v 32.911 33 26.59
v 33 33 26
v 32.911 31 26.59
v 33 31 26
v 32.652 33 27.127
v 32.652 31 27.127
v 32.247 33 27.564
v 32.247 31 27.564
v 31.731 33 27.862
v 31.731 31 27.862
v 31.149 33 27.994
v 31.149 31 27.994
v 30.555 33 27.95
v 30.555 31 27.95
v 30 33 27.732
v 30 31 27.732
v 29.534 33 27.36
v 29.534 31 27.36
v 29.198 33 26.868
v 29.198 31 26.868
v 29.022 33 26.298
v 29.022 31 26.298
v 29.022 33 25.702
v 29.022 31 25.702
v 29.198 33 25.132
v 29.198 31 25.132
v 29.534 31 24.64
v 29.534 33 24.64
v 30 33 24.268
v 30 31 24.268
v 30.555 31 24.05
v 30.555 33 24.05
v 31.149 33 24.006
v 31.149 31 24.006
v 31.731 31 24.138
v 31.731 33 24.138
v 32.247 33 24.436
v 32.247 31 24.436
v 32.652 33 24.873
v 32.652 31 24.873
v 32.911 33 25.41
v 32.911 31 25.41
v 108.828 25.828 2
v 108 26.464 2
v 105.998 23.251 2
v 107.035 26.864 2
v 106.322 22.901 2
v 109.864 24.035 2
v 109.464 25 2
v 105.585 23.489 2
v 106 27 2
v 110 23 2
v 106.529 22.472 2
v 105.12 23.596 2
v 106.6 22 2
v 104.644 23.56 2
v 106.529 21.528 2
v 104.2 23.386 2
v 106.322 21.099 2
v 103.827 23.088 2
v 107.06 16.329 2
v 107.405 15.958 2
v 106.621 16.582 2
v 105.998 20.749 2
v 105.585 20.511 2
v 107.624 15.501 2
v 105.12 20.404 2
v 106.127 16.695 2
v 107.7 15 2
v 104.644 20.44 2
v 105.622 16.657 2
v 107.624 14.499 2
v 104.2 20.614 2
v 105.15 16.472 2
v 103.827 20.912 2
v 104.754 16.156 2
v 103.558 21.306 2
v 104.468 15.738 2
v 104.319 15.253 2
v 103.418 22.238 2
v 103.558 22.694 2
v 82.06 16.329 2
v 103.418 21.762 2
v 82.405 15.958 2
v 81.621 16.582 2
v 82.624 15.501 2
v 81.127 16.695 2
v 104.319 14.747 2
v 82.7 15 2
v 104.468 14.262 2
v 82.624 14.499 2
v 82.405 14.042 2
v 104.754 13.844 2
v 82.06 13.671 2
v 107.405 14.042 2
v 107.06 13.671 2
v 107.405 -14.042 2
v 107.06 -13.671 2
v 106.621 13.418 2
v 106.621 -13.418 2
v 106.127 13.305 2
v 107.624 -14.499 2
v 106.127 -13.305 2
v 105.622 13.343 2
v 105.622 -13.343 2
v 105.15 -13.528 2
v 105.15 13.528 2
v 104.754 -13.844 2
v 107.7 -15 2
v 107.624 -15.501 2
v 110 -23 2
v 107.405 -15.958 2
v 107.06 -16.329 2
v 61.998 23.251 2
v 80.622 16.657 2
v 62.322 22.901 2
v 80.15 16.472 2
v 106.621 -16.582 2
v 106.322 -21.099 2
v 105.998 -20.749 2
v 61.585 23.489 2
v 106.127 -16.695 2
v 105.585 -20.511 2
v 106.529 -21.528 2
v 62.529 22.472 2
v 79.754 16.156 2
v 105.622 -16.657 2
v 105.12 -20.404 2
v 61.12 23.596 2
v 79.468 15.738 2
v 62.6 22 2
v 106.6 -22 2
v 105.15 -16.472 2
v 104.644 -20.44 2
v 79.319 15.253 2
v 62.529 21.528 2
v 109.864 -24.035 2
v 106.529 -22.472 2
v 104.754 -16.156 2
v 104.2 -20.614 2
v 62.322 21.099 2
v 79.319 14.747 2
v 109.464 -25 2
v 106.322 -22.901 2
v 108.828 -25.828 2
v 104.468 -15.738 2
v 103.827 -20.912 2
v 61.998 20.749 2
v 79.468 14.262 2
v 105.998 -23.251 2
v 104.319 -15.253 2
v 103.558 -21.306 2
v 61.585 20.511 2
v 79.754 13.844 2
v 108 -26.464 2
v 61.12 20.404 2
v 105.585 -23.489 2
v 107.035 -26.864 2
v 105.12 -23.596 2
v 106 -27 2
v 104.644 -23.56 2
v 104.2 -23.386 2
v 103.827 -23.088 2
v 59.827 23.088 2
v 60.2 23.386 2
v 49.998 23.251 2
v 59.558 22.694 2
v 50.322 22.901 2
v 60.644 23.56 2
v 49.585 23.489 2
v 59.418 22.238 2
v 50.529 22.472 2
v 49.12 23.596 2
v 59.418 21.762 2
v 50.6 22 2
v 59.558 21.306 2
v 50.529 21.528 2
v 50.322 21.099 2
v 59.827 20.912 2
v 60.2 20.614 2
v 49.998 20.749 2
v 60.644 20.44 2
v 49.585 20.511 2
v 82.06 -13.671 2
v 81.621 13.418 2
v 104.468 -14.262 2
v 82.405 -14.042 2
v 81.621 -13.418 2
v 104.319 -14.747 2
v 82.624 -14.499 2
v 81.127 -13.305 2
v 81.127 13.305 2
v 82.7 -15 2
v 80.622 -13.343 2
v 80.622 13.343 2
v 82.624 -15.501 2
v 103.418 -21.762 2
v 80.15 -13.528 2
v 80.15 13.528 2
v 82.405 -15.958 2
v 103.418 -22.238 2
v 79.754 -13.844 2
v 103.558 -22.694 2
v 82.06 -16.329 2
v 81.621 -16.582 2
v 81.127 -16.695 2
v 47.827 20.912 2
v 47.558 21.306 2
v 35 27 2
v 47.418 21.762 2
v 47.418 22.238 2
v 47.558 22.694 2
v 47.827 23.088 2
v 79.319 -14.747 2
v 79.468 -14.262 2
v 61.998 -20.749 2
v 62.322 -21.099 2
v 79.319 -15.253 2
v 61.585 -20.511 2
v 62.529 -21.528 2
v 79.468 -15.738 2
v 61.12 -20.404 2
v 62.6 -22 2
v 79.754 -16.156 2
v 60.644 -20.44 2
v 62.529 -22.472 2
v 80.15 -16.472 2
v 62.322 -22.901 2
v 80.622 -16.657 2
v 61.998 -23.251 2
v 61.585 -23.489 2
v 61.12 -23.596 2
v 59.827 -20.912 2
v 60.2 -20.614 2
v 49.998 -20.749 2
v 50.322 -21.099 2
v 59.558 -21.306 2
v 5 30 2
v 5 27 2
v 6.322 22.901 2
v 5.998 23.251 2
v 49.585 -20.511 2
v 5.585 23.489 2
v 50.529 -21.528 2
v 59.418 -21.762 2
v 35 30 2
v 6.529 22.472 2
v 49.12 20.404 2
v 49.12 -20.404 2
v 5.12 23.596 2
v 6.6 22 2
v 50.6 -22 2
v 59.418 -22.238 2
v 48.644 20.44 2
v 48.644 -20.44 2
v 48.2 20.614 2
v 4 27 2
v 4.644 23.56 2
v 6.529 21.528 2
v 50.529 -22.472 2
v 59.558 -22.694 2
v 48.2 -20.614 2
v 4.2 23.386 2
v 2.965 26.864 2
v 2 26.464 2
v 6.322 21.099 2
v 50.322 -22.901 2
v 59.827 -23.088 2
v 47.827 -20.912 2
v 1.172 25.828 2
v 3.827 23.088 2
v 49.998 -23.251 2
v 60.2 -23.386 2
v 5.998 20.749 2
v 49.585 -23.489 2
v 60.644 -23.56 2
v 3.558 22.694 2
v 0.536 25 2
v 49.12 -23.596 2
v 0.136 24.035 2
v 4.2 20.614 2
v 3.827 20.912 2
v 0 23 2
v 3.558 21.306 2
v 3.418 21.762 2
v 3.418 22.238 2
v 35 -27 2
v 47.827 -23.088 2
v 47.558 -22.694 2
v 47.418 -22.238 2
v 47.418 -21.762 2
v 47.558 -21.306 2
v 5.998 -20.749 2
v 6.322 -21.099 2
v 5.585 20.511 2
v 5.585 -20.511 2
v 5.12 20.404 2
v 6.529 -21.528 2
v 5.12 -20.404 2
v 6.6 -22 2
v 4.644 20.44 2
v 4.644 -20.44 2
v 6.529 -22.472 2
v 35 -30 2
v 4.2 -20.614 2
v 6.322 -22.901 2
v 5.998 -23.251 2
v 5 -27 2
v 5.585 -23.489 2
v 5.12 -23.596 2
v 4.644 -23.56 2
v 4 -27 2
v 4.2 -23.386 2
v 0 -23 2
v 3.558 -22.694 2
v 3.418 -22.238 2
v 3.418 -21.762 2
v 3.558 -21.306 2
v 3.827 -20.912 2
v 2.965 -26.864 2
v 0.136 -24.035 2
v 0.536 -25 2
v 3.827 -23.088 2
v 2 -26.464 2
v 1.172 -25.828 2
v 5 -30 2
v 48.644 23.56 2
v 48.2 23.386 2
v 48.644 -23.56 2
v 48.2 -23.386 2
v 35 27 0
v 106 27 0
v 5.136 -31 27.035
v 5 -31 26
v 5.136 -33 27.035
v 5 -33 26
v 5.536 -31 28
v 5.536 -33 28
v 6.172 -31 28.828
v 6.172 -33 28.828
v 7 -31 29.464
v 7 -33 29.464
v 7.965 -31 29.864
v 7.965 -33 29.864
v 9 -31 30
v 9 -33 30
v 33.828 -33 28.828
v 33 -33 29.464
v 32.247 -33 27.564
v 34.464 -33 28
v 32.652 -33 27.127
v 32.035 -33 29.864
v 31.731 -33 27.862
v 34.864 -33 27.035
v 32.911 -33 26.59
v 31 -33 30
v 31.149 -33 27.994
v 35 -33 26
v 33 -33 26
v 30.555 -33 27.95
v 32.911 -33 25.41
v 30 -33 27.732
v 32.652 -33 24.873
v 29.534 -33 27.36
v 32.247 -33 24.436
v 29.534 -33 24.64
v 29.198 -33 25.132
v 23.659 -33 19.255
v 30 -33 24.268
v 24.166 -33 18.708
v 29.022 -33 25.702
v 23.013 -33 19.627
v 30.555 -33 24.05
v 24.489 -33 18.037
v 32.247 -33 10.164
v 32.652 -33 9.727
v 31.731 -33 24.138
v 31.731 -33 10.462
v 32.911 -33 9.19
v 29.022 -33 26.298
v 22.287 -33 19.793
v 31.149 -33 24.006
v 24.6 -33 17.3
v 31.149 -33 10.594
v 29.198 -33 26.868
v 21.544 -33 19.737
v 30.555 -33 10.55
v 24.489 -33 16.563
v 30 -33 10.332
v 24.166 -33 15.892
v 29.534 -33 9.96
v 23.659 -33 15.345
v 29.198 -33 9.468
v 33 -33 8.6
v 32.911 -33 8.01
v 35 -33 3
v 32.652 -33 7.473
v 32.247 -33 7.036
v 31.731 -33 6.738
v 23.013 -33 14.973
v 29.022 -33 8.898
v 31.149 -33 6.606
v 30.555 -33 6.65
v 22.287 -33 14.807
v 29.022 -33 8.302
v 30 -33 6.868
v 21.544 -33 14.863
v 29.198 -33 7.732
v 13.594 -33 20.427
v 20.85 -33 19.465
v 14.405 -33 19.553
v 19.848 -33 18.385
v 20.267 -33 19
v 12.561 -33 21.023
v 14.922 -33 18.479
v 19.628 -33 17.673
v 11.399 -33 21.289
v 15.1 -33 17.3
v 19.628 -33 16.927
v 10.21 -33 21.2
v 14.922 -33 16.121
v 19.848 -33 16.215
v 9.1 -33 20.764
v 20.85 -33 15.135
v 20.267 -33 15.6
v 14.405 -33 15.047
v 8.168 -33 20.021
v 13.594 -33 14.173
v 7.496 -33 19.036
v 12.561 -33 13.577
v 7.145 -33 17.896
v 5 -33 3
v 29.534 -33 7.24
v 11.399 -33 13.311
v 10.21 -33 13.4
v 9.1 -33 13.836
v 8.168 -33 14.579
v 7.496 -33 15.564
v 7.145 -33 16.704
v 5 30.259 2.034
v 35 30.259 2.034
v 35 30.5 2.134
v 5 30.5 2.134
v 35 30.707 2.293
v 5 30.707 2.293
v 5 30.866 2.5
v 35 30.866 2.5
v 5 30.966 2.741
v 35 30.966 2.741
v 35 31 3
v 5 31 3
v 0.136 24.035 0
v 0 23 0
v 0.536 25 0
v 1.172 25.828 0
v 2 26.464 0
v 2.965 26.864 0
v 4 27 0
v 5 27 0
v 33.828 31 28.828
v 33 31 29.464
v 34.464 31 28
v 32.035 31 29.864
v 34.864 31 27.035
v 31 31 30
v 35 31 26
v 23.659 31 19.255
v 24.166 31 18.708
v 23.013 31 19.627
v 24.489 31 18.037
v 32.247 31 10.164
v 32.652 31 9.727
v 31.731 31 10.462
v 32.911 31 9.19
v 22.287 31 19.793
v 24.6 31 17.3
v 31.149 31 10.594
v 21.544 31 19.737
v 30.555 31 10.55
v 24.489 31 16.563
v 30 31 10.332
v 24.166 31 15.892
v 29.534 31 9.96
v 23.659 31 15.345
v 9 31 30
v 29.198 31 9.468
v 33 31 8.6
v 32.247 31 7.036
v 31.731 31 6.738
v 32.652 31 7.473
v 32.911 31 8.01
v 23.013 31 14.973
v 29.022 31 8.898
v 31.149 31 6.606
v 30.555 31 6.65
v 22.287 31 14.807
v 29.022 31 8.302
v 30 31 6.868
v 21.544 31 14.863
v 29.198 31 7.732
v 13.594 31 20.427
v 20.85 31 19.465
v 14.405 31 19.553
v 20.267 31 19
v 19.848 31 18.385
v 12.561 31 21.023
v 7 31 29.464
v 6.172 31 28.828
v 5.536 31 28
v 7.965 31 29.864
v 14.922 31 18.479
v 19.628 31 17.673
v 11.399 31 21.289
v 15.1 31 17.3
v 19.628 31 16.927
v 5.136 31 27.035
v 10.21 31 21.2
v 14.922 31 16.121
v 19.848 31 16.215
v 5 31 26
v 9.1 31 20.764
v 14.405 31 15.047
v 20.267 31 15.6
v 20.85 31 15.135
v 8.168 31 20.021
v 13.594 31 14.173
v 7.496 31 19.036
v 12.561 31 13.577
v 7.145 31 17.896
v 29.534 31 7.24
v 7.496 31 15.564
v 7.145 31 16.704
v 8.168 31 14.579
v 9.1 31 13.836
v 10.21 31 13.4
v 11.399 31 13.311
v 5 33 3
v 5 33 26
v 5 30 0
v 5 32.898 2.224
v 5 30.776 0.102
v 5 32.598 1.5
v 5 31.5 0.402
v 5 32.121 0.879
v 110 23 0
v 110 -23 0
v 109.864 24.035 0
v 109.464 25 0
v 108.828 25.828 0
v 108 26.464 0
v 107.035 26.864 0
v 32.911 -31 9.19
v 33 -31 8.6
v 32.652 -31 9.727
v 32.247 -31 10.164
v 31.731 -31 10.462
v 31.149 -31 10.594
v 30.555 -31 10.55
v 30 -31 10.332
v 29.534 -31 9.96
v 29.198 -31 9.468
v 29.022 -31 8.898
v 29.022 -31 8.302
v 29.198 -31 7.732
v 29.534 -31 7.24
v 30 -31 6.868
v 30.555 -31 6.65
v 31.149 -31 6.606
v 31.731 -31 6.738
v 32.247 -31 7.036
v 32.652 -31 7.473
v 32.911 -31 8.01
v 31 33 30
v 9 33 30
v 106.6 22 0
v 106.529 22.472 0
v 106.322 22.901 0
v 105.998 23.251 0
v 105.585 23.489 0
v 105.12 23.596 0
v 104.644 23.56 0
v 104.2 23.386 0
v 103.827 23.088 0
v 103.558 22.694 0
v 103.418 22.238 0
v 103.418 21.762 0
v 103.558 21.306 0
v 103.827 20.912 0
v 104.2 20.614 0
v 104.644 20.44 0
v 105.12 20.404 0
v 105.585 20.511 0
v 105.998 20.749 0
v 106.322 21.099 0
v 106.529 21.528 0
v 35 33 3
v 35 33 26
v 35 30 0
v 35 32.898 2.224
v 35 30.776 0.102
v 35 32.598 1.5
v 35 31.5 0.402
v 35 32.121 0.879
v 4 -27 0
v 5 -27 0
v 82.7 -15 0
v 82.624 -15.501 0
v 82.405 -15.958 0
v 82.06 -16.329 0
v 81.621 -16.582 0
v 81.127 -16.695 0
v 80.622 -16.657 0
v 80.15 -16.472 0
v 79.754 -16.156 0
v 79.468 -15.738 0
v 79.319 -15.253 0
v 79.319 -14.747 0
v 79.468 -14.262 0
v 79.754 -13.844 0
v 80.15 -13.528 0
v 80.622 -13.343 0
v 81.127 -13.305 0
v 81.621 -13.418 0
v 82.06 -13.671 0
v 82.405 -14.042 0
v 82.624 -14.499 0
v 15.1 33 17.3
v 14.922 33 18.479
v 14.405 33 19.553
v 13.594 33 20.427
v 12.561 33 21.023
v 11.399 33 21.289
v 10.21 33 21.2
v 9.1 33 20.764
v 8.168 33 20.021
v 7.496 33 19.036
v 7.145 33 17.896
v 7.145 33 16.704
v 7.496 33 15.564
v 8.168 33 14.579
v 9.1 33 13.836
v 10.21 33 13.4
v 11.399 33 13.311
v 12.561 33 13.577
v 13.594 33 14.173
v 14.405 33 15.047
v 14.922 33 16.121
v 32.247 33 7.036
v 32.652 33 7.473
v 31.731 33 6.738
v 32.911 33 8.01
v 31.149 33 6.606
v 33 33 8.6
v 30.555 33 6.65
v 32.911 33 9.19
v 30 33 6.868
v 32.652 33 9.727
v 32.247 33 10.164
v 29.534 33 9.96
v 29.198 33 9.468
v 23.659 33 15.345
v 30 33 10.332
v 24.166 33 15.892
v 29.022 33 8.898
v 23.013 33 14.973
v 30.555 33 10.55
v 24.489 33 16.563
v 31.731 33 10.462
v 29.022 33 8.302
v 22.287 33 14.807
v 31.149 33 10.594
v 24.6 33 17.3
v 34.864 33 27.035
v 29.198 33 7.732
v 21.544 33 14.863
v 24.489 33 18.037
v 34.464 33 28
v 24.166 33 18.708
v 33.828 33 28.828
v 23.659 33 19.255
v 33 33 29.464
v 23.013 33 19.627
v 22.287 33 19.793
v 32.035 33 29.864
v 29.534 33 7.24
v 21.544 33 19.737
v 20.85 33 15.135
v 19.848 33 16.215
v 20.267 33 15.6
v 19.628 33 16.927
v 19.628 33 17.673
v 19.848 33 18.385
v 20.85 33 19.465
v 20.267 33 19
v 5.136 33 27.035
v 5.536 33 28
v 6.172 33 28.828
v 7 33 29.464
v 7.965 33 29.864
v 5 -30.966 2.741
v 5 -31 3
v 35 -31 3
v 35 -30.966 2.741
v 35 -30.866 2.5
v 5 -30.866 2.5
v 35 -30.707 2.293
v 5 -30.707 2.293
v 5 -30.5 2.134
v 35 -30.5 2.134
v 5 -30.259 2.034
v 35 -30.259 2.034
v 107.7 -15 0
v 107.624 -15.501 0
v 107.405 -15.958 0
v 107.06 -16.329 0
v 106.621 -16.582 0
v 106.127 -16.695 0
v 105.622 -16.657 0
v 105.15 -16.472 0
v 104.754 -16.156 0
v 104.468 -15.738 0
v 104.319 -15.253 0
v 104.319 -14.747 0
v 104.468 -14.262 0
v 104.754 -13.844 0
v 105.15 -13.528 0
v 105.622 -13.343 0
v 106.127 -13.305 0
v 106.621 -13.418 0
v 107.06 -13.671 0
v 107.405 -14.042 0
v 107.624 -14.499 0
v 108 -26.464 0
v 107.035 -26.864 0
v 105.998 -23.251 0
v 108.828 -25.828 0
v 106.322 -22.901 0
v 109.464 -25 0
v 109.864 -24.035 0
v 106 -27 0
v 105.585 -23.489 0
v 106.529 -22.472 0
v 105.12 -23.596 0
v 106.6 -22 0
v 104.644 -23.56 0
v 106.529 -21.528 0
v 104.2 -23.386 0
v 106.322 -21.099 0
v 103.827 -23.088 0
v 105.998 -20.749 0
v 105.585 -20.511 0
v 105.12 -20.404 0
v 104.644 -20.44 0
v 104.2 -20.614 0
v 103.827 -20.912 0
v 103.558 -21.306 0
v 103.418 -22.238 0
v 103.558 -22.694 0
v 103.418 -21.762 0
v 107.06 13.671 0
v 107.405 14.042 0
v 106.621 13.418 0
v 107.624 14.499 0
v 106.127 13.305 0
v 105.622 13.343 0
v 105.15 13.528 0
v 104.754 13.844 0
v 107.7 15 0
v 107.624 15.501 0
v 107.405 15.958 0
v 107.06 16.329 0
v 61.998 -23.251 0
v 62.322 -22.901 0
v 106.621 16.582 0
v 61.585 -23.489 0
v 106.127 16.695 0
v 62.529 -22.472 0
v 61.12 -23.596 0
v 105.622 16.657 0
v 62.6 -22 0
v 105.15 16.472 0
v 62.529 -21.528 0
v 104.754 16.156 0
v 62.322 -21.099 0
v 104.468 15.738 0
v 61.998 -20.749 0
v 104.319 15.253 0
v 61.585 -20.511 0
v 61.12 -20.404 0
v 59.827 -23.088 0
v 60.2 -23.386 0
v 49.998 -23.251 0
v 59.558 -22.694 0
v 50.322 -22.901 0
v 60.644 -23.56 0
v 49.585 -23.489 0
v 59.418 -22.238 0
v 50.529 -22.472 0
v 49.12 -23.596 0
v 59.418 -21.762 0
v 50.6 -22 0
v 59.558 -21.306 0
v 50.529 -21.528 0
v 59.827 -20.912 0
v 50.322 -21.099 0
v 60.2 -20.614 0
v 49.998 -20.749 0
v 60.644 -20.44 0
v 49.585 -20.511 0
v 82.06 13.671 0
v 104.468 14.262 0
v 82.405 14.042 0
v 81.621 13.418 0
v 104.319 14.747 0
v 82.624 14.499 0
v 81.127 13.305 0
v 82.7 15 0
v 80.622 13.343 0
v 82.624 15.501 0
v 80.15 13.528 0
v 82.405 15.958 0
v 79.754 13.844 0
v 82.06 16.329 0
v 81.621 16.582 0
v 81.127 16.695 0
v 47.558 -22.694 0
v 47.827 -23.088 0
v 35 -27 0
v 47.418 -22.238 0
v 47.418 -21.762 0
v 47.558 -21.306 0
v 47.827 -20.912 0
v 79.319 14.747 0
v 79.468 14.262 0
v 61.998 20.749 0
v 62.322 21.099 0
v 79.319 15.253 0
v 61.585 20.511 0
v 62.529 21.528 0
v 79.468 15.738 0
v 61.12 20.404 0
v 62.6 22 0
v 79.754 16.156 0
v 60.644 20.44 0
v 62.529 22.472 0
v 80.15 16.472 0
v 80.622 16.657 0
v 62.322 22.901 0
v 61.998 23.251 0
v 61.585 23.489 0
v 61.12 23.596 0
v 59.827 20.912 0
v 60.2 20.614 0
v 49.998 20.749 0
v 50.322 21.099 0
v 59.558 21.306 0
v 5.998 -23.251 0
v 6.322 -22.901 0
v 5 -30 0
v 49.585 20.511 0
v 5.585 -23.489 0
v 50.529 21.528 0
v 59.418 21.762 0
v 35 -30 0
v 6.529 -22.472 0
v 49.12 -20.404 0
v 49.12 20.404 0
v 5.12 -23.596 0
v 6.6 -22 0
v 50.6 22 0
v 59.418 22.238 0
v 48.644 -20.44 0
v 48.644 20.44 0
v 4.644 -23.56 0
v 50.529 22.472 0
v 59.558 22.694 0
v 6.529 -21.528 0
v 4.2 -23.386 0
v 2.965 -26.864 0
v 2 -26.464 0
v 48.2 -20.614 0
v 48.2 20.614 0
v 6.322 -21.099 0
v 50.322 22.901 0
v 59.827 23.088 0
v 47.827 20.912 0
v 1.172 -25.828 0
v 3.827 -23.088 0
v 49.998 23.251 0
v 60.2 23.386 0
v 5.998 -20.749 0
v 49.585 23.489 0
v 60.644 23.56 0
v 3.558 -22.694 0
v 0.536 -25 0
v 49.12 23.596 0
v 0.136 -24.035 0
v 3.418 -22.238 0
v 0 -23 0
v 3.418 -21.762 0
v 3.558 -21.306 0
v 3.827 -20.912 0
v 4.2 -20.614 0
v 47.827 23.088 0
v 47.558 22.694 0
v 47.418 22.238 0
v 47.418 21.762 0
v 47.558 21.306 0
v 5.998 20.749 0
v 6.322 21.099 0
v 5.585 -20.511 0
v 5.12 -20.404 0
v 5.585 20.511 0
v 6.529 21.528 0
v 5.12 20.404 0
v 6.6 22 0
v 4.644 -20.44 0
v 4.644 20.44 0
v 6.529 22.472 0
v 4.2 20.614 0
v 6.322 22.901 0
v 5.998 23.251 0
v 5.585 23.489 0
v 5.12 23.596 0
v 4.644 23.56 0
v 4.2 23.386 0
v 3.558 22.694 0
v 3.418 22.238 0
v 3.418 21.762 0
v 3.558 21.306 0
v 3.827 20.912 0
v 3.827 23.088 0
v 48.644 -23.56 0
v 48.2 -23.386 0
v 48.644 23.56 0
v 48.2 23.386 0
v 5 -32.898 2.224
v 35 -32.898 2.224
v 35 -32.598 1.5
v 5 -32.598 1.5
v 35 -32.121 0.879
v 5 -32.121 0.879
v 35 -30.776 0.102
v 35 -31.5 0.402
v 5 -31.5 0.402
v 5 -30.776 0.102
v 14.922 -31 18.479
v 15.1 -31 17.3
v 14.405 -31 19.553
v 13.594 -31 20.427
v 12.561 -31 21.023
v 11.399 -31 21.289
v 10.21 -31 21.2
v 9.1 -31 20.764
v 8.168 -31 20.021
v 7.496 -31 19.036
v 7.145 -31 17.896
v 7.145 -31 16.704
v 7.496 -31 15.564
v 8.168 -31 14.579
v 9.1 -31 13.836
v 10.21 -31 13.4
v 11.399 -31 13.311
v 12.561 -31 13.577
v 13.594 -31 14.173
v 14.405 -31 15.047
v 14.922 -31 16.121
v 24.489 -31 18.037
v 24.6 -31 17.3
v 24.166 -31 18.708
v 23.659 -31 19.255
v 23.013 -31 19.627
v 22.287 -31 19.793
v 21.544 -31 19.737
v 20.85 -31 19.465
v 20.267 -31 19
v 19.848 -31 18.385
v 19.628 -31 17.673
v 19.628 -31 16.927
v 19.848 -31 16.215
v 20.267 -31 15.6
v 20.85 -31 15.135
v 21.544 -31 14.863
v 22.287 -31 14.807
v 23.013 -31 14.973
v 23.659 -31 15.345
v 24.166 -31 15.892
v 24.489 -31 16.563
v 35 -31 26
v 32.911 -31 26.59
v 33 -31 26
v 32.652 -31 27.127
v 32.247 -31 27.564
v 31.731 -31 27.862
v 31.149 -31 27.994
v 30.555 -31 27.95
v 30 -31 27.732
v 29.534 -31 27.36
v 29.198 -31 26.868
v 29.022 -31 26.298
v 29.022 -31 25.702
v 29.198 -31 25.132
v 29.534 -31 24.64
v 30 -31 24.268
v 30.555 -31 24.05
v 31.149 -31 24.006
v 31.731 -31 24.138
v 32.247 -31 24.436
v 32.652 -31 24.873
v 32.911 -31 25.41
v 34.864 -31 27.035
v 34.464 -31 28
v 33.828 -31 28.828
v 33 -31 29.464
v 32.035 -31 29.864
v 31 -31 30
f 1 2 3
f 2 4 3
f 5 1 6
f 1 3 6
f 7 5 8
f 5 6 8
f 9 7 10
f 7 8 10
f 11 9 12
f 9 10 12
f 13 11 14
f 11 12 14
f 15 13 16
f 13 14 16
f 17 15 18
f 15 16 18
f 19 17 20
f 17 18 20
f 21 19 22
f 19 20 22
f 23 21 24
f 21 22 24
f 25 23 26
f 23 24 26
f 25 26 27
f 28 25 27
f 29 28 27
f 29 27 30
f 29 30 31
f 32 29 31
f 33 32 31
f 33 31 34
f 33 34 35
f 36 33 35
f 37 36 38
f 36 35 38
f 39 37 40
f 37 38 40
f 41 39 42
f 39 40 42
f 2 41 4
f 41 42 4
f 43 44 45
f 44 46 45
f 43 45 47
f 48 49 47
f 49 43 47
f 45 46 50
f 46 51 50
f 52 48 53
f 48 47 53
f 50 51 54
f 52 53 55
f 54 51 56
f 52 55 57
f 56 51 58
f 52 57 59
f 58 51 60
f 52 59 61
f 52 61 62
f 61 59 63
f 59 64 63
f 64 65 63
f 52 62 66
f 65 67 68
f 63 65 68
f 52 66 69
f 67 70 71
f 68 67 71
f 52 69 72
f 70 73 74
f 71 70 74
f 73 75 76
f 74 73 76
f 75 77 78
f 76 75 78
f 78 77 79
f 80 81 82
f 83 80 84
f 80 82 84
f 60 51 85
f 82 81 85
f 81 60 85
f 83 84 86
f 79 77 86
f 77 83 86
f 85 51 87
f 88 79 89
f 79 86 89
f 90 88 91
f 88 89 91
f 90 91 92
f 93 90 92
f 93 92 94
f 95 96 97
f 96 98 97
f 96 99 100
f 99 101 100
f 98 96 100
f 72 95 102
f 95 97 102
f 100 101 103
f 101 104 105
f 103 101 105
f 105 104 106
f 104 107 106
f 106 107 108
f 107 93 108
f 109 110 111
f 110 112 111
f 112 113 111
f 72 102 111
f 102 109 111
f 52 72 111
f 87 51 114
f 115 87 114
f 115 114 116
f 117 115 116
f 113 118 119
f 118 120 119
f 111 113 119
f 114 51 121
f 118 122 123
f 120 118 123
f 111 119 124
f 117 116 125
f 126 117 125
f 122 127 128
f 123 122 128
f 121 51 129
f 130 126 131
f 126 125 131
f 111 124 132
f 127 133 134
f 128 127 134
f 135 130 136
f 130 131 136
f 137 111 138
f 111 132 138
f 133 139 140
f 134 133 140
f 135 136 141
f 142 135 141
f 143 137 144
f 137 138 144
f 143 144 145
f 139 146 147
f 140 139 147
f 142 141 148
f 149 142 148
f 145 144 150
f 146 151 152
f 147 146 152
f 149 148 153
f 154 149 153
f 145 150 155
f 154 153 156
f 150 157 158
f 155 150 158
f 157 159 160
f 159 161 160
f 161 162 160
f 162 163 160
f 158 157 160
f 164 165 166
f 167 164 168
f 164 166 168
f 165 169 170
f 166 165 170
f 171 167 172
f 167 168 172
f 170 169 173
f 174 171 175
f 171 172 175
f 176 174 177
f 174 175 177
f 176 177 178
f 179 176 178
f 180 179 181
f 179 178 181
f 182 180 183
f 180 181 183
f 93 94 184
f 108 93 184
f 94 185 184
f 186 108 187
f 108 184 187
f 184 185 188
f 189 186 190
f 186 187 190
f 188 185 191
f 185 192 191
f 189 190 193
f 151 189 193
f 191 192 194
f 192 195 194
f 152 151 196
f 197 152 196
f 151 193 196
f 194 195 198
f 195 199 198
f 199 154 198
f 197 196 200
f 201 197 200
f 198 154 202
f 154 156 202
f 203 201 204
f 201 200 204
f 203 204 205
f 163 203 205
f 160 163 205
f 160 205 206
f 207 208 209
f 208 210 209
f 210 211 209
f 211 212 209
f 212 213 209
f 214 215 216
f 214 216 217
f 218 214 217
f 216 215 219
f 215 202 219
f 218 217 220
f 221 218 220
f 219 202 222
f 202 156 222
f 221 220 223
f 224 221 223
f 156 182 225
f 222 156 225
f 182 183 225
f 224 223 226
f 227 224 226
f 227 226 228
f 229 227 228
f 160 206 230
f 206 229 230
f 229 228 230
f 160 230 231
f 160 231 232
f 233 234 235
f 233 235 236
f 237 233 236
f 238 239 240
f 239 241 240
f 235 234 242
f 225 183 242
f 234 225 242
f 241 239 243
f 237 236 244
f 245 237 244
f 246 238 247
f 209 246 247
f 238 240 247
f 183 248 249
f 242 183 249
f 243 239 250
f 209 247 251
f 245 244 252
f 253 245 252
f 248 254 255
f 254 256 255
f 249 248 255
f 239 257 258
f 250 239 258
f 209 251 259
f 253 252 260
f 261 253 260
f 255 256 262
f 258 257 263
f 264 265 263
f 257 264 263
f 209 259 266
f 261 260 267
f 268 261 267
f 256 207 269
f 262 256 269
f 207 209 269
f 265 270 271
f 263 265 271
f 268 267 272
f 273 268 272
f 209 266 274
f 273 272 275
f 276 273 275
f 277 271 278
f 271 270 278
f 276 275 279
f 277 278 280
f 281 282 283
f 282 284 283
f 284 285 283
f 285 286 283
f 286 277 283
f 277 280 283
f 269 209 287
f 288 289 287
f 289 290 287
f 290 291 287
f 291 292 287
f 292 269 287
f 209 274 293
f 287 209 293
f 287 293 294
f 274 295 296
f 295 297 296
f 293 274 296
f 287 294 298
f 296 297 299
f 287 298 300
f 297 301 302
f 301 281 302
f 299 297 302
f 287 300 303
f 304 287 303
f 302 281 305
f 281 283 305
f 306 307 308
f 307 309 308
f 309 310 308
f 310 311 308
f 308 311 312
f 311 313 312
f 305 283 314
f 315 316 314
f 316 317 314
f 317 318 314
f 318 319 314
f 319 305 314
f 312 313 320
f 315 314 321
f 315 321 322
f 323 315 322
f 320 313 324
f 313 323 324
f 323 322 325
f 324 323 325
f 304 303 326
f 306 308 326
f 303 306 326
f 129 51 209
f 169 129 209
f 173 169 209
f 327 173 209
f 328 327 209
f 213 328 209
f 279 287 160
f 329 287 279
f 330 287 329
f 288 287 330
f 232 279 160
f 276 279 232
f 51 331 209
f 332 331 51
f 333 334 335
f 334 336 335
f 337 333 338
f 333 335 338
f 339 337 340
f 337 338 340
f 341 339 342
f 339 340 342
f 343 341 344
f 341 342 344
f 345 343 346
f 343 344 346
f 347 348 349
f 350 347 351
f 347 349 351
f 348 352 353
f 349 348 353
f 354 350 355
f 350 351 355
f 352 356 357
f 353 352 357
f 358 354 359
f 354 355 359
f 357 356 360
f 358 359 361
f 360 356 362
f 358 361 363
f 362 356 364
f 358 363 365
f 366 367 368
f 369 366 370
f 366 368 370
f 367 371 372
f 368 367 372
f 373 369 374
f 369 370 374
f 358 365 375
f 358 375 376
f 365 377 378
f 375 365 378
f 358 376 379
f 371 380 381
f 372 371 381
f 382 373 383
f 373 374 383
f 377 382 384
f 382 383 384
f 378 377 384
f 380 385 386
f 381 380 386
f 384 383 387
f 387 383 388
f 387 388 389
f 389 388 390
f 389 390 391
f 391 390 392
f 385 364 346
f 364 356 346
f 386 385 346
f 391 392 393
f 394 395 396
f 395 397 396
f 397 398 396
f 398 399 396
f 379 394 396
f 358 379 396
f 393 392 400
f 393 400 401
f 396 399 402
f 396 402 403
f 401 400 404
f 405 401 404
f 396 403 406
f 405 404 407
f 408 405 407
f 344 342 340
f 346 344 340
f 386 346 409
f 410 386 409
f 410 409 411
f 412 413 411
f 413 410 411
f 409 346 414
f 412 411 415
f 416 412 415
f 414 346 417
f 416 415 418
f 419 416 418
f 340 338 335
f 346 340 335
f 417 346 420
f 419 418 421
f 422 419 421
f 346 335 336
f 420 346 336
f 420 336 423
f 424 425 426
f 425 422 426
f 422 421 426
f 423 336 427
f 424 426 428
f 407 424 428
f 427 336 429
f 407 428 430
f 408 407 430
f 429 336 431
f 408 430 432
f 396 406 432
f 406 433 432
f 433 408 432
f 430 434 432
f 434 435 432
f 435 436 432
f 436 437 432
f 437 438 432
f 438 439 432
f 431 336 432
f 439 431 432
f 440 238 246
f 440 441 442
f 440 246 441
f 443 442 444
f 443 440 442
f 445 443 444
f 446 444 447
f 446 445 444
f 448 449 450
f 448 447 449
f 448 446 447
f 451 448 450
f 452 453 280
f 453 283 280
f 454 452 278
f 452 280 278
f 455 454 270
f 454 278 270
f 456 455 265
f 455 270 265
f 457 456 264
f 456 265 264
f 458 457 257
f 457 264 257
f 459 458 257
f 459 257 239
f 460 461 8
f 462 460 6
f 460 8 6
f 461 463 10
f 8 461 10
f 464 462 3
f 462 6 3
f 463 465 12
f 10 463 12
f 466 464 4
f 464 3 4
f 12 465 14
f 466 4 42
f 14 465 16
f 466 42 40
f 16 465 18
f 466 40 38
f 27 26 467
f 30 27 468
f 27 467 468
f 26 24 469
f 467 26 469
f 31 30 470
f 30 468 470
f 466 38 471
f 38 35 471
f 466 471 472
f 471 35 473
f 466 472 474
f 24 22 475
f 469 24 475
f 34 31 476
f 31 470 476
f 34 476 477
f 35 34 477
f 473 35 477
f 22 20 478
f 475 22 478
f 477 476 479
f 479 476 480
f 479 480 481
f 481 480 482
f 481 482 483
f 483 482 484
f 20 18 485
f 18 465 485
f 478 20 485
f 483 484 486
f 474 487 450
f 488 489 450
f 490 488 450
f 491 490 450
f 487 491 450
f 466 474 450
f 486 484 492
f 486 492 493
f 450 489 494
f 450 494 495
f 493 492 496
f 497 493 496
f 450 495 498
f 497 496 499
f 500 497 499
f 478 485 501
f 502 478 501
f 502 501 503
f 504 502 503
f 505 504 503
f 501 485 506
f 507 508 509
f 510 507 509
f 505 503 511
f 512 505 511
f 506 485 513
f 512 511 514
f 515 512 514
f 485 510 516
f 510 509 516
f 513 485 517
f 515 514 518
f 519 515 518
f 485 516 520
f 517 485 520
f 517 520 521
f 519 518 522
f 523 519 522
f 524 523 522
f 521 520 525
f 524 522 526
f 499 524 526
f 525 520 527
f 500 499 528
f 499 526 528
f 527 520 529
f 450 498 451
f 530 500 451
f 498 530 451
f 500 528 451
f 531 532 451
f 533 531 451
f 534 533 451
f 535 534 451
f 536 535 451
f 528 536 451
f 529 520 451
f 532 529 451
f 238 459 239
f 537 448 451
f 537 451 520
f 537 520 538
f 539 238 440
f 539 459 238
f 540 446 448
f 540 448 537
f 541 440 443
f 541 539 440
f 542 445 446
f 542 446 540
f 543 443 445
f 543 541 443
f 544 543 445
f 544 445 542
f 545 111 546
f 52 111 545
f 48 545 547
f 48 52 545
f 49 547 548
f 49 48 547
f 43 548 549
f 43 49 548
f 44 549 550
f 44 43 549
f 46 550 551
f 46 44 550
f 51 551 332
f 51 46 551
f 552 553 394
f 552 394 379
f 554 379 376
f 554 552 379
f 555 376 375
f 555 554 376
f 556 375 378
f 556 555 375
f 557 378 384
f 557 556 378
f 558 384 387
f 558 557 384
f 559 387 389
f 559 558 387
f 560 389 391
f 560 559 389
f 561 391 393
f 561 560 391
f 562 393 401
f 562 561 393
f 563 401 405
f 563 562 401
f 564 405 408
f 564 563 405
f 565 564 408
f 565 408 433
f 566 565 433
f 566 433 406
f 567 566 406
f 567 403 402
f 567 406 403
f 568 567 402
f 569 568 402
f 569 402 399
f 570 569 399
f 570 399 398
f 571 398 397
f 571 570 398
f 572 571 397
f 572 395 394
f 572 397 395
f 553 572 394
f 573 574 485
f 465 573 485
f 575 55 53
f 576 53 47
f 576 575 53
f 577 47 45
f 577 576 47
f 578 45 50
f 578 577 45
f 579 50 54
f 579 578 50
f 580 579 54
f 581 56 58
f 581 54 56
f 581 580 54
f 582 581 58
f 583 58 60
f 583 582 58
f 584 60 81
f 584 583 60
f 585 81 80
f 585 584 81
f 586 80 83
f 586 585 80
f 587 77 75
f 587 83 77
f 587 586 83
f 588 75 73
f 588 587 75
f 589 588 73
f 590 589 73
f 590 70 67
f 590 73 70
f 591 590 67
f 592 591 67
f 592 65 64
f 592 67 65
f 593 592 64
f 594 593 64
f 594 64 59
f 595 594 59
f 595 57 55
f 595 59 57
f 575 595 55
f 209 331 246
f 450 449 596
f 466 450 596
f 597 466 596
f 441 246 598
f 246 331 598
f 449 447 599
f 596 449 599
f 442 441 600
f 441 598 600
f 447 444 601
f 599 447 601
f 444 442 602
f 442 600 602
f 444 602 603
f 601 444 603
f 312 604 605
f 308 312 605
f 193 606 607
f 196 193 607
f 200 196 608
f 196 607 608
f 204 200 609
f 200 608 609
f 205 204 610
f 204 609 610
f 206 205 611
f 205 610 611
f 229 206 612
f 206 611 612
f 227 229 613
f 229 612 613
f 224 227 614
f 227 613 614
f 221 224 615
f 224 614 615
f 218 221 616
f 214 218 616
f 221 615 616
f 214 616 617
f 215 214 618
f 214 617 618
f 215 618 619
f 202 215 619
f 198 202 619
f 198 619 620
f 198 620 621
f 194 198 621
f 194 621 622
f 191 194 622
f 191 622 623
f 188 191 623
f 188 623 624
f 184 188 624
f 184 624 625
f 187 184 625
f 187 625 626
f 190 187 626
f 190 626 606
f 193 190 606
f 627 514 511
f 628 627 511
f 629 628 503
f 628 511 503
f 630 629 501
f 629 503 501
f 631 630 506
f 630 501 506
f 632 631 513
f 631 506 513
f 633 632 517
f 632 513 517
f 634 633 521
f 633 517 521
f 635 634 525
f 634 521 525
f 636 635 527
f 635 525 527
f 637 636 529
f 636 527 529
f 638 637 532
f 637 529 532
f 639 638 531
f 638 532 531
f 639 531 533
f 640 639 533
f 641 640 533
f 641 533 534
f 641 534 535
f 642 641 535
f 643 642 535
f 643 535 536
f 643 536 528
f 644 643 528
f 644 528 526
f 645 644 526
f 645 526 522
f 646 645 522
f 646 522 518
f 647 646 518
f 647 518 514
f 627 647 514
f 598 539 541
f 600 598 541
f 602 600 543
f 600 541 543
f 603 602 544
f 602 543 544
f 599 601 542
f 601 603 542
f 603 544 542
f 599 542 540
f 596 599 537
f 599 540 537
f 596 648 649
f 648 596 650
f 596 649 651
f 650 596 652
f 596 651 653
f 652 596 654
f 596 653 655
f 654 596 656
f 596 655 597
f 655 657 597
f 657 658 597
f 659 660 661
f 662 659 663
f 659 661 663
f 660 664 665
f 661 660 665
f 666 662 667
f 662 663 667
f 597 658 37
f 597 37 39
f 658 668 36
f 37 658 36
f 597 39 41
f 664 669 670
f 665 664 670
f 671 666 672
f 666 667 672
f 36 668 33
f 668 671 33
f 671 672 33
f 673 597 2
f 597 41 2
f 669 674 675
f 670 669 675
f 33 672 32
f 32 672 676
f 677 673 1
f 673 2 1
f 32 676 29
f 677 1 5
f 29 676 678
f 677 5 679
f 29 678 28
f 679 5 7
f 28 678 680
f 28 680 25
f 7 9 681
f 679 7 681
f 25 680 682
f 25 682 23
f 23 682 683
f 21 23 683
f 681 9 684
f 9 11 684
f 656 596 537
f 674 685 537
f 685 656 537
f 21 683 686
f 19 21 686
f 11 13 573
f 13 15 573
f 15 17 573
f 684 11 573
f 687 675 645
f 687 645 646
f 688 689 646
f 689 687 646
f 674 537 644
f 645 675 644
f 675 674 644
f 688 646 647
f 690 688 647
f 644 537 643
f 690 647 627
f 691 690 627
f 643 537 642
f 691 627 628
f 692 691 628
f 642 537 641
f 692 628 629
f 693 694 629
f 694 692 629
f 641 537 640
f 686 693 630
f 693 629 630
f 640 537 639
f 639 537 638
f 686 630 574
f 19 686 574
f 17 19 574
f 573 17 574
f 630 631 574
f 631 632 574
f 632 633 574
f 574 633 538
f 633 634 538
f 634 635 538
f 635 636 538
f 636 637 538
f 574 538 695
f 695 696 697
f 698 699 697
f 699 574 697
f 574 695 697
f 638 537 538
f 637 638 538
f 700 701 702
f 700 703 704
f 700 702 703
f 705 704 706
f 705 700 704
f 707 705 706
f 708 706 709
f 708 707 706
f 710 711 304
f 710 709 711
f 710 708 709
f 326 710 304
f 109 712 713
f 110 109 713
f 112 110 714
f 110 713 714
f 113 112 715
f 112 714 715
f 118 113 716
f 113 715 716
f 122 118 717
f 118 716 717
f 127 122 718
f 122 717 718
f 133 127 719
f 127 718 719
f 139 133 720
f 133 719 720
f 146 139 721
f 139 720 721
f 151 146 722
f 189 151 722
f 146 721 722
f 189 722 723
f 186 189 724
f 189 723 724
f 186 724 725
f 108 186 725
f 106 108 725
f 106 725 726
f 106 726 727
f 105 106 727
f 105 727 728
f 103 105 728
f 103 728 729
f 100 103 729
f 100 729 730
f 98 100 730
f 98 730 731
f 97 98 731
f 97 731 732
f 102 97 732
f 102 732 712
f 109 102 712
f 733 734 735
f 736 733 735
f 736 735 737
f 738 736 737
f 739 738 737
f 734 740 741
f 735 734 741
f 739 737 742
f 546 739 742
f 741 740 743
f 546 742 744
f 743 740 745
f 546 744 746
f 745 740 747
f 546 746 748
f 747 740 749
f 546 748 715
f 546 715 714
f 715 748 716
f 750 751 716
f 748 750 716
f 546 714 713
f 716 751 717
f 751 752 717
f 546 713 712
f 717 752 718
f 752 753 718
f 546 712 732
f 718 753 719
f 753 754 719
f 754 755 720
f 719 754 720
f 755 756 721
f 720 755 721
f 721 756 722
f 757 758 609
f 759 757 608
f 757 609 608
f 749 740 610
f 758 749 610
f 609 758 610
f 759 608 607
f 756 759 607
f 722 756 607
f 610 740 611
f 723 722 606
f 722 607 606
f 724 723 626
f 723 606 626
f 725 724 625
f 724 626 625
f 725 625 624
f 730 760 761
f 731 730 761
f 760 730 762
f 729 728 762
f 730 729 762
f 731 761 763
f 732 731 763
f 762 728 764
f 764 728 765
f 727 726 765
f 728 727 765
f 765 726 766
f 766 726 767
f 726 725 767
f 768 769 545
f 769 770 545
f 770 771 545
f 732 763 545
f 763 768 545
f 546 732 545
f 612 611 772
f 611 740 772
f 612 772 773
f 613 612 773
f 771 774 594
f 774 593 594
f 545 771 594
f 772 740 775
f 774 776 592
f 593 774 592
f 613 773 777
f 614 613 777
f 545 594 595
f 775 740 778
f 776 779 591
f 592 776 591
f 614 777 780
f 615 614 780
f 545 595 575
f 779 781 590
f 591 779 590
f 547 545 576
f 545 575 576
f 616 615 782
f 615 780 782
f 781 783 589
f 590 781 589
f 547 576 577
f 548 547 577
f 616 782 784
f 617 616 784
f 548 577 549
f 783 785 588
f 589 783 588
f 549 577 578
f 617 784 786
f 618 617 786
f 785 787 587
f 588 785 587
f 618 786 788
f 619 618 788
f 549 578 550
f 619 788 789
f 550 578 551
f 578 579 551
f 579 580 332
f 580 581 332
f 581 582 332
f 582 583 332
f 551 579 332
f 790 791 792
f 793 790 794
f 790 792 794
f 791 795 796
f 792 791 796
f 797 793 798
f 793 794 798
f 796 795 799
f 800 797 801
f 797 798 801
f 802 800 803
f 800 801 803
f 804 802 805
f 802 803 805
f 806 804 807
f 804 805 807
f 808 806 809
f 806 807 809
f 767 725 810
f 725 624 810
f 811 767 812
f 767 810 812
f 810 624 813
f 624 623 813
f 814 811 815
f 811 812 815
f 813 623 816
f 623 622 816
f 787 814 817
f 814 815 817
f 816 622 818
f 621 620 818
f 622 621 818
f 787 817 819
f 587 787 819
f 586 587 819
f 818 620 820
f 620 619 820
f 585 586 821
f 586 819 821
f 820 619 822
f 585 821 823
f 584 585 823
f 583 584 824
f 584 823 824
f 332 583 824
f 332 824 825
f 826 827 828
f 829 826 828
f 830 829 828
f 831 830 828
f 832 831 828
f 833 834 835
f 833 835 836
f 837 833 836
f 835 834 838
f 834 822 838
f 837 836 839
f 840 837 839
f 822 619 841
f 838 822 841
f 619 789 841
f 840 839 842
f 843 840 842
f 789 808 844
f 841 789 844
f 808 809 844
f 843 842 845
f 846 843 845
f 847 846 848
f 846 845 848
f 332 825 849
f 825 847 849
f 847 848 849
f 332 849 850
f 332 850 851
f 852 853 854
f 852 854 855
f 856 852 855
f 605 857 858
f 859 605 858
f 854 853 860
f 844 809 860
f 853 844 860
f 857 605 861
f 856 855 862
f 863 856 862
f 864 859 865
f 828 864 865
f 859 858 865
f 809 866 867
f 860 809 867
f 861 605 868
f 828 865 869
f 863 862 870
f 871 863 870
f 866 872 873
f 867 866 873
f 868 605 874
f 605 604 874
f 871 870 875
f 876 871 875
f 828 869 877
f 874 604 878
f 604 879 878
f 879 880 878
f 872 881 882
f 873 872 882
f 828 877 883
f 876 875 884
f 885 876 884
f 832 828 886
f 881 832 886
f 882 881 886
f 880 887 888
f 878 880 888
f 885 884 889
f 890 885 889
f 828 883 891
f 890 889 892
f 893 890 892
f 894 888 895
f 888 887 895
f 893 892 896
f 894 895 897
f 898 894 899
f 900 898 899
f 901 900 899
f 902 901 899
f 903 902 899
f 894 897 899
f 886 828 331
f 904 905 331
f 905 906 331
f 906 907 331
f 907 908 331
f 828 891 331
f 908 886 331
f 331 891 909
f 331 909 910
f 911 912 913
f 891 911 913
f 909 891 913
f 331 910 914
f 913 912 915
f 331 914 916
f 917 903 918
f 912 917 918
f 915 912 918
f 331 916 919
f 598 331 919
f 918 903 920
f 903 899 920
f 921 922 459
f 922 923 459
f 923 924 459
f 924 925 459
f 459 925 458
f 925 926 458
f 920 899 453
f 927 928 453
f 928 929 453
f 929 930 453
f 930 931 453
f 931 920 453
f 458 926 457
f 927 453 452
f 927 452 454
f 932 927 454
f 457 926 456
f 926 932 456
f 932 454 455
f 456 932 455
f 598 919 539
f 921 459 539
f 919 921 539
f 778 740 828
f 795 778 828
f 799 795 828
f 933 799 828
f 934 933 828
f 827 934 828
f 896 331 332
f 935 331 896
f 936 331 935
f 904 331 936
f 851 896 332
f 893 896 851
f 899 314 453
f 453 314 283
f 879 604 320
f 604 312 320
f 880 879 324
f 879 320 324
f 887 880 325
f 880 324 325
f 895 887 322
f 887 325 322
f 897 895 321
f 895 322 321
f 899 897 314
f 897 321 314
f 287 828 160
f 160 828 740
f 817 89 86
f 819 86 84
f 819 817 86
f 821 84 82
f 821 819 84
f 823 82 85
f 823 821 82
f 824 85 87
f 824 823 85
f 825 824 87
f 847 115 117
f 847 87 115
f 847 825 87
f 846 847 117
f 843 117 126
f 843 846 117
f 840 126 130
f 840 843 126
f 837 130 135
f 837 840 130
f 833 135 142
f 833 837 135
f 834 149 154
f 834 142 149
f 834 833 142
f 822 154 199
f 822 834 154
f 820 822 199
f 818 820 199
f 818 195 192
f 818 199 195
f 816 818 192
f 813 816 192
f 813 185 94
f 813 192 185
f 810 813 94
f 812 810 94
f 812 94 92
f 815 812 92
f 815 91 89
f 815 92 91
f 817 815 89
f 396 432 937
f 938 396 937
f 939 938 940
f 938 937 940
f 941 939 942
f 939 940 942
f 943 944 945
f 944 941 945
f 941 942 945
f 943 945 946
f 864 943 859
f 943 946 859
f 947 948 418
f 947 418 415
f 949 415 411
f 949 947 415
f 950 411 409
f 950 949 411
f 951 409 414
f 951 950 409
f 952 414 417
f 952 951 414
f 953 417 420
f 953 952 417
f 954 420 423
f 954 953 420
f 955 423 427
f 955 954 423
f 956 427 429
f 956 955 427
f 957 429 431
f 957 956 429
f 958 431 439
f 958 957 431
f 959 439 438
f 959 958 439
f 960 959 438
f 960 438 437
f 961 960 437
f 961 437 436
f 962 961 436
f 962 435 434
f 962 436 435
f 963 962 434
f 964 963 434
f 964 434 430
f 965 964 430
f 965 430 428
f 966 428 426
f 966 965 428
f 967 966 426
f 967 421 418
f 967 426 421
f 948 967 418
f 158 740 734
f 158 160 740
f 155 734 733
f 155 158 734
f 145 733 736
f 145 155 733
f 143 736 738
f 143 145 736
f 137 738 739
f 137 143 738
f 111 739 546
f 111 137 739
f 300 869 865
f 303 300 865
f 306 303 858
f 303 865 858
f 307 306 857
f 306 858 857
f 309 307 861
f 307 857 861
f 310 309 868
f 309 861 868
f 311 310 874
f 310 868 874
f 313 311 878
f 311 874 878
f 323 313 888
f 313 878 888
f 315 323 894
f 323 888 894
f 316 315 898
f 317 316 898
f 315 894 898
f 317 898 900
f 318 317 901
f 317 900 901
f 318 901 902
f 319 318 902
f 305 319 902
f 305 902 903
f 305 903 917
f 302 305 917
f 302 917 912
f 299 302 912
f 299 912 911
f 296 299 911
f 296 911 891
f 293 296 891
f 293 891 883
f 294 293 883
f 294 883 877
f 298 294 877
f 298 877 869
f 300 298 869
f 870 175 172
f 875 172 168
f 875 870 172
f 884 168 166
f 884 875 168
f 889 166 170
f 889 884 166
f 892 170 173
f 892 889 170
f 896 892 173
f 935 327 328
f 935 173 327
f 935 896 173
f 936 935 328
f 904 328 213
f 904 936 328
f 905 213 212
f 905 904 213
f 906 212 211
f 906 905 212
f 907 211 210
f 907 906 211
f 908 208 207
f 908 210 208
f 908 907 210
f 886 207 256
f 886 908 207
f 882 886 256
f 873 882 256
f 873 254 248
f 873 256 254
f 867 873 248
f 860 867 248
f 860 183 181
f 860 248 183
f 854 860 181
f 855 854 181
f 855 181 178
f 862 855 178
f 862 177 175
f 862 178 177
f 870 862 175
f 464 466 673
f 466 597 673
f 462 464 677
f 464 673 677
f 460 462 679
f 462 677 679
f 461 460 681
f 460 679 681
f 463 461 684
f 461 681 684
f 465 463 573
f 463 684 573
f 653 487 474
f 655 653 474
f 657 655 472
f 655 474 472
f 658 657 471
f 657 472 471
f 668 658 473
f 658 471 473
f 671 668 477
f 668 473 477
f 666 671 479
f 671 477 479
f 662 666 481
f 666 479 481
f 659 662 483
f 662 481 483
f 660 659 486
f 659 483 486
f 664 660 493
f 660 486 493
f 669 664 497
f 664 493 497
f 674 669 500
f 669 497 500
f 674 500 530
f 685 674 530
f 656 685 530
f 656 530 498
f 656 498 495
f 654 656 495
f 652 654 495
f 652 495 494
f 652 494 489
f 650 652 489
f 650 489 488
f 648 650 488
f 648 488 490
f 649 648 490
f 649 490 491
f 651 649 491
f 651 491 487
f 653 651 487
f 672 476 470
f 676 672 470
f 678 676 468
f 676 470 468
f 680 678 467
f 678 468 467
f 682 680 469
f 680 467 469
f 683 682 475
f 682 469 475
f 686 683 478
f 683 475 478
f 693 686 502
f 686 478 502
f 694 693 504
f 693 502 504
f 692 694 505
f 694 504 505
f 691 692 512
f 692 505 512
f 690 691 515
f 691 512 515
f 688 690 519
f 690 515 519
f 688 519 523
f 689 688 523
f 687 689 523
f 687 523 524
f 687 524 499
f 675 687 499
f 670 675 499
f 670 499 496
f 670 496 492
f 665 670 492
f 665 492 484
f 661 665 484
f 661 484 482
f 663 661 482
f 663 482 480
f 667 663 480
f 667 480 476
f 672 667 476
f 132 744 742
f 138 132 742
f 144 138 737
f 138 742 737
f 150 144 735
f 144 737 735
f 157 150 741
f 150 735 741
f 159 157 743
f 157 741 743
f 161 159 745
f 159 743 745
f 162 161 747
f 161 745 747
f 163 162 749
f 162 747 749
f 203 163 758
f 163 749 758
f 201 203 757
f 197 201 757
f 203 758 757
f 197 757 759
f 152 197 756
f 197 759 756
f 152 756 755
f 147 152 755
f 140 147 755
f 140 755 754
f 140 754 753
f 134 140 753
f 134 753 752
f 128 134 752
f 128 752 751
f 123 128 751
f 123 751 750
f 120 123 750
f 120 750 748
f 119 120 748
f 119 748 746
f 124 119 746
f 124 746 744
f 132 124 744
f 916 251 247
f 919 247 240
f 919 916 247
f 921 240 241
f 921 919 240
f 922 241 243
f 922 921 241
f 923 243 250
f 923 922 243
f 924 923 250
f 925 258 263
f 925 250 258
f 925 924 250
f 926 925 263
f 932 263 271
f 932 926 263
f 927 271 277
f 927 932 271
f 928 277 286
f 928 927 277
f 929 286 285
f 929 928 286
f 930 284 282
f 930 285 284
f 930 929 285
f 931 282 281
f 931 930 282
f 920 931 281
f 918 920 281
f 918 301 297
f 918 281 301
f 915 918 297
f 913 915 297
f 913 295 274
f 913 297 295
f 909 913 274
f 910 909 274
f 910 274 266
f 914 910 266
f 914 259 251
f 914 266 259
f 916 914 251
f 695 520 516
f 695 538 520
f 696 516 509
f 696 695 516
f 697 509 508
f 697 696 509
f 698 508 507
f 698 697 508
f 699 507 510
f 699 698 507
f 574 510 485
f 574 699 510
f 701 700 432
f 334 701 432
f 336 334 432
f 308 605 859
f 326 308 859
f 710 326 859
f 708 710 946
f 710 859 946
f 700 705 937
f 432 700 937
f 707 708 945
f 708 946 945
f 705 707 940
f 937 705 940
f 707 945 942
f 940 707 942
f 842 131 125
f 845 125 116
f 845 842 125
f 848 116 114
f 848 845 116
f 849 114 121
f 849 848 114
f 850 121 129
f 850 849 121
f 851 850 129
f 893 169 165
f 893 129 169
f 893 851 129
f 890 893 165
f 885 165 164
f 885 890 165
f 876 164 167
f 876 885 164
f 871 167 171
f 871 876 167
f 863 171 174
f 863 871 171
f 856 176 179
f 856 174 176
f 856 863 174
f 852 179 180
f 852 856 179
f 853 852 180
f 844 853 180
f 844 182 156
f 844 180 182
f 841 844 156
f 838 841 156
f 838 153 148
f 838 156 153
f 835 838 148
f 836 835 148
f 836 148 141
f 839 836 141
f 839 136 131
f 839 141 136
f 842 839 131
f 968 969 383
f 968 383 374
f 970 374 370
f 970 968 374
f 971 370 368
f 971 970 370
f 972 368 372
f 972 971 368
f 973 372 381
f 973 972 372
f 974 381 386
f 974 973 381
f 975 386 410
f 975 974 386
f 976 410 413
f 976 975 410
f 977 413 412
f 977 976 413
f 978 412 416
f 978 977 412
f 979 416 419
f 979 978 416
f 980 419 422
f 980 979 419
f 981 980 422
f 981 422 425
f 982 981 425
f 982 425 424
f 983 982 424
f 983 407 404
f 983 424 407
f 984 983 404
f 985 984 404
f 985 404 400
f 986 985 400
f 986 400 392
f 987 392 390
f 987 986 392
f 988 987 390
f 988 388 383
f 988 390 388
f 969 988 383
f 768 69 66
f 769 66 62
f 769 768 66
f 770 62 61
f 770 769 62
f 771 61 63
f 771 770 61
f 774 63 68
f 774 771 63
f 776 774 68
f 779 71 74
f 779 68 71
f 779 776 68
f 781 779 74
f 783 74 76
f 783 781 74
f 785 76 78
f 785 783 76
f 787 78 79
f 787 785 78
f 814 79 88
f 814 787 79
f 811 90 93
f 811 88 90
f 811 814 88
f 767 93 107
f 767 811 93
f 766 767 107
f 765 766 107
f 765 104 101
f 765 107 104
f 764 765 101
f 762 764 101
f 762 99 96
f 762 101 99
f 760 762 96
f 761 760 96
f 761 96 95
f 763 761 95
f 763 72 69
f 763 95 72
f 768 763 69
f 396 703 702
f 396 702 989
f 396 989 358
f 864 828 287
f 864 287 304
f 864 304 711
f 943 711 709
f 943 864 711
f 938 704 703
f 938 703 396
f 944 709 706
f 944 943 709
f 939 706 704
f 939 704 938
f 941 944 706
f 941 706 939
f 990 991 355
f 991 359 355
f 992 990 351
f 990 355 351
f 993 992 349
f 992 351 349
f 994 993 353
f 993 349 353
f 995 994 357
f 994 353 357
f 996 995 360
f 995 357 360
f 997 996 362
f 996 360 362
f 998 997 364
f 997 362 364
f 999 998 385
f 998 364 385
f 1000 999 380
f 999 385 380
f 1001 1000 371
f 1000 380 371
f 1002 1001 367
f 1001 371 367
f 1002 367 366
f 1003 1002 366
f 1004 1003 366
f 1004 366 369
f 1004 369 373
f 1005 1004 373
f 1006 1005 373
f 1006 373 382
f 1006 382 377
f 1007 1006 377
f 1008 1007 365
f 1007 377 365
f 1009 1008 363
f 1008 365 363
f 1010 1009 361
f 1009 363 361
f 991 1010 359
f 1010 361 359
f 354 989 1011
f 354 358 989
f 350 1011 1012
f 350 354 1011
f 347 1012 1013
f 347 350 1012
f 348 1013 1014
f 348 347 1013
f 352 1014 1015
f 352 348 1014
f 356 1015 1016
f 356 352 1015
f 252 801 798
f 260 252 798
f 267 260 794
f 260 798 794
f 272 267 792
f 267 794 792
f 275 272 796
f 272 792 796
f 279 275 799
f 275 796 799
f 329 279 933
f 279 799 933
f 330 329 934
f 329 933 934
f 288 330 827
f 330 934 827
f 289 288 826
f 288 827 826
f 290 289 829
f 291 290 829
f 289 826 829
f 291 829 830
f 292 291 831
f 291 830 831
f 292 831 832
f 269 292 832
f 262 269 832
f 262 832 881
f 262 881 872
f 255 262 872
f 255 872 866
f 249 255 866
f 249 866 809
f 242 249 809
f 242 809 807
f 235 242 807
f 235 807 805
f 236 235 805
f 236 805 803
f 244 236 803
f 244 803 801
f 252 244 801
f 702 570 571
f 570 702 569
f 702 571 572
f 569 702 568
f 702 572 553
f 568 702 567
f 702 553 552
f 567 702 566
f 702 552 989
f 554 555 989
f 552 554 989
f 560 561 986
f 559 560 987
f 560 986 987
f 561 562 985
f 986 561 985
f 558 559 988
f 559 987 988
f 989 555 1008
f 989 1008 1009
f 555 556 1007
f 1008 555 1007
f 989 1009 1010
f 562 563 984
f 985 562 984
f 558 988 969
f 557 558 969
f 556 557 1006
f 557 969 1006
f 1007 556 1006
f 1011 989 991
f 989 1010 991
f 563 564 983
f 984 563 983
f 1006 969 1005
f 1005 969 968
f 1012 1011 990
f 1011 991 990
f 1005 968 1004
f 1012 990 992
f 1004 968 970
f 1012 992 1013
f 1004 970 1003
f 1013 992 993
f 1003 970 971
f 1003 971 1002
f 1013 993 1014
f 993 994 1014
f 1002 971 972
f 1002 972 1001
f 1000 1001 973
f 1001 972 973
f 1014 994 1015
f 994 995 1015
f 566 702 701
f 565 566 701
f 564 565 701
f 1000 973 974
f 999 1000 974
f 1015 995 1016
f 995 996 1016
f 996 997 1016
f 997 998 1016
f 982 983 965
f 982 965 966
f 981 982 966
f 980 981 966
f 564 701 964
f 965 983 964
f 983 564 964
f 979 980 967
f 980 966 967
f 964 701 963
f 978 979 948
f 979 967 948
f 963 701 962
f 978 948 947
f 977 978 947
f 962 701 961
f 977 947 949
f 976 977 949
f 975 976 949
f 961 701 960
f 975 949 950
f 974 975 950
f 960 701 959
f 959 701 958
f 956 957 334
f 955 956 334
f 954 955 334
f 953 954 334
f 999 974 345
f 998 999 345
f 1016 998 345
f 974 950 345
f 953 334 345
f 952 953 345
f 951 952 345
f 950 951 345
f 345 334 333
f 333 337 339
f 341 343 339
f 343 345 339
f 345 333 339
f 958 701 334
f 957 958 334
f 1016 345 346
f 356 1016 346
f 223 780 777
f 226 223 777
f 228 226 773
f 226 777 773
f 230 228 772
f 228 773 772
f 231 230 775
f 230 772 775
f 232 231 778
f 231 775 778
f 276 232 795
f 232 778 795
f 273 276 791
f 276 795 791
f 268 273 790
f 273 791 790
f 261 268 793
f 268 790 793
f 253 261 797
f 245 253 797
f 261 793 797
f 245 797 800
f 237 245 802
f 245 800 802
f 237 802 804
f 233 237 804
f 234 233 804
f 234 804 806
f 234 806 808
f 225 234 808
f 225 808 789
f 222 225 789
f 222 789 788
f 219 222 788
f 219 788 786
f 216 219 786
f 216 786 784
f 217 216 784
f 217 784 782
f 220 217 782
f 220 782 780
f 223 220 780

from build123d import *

# Parameters (mm, degrees)
SKETCH003_R      = 1.6
SKETCH003_R_2    = 1.7
EXTRUDE003_DEPTH = 10
SKETCH002_R      = 4
SKETCH002_R_2    = 2.5
SKETCH002_R_3    = 2
EXTRUDE002_DEPTH = 60
SKETCH001_W      = 79.47419
SKETCH001_H      = 9.458714
SKETCH001_W_2    = 5
EXTRUDE001_DEPTH = 40
EXTRUDE_DEPTH    = 110
FILLET_R         = 4
FILLET001_R      = 4


with BuildPart() as extrude003:
    # Sketch003 → Extrude003 (new body)
    with BuildSketch(Plane.XY):
        with Locations((5, 22)):
            Circle(SKETCH003_R)
        with Locations((49, 22)):
            Circle(SKETCH003_R)
        with Locations((61, 22)):
            Circle(SKETCH003_R)
        with Locations((105, 22)):
            Circle(SKETCH003_R)
        with Locations((81, 15)):
            Circle(SKETCH003_R_2)
        with Locations((106, 15)):
            Circle(SKETCH003_R_2)
    extrude(amount=EXTRUDE003_DEPTH)


with BuildPart() as fusion001:
    # Part__Mirroring001: instance of Extrude003
    add(extrude003.part.mirror(Plane(origin=(0, 0, 0), x_dir=(1, 0, 0), z_dir=(0, 1, 0))))

    # Fusion001: union Extrude003
    add(extrude003.part)


with BuildPart() as extrude002:
    # Sketch002 → Extrude002 (new body, symmetric)
    with BuildSketch(Plane.XZ):
        with Locations((11.1, 17.3)):
            Circle(SKETCH002_R)
        with Locations((22.1, 17.3)):
            Circle(SKETCH002_R_2)
        with Locations((31, 8.6)):
            Circle(SKETCH002_R_3)
        with Locations((31, 26)):
            Circle(SKETCH002_R_3)
    extrude(amount=EXTRUDE002_DEPTH, both=True)


with BuildPart() as extrude001:
    # Sketch001 → Extrude001 (new body)
    with BuildSketch(Plane.XY):
        with Locations((74.737095, 31.729357)):
            Rectangle(SKETCH001_W, SKETCH001_H)
        with Locations((2.5, 31.729357)):
            Rectangle(SKETCH001_W_2, SKETCH001_H)
    extrude(amount=EXTRUDE001_DEPTH)


with BuildPart() as part_mirroring:
    # Part__Mirroring: instance of Extrude001
    add(extrude001.part.mirror(Plane(origin=(0, 0, 0), x_dir=(1, 0, 0), z_dir=(0, 1, 0))))


with BuildPart() as fusion:
    # Fusion base: copy of Extrude001
    add(extrude001.part)

    # Fusion: union Part__Mirroring
    add(part_mirroring.part)


with BuildPart() as fillet001:
    # Sketch → Extrude (new body)
    with BuildSketch(Plane.YZ):
        with BuildLine():
            Line((-33, 30), (-33, 3))
            ThreePointArc((-33, 3), (-32.12132, 0.87868), (-30, 0))
            Line((-30, 0), (30, 0))
            ThreePointArc((30, 0), (32.12132, 0.87868), (33, 3))
            Line((33, 3), (33, 30))
            Line((33, 30), (31, 30))
            Line((31, 30), (31, 3))
            ThreePointArc((30, 2), (30.707107, 2.292893), (31, 3))
            Line((30, 2), (-30, 2))
            ThreePointArc((-31, 3), (-30.707107, 2.292893), (-30, 2))
            Line((-31, 3), (-31, 30))
            Line((-31, 30), (-33, 30))
        make_face()
    extrude(amount=EXTRUDE_DEPTH)

    # Cut: cut Fusion
    add(fusion.part, mode=Mode.SUBTRACT)

    # Cut001: cut Extrude002
    add(extrude002.part, mode=Mode.SUBTRACT)

    # Cut002: cut Fusion001
    add(fusion001.part, mode=Mode.SUBTRACT)

    # Fillet
    fillet_edges = [fillet001.edges().sort_by_distance(p)[0] for p in [
        (0, -27, 1),
        (110, -27, 1),
        (0, 27, 1),
        (110, 27, 1),
    ]]
    fillet(fillet_edges, radius=FILLET_R)

    # Fillet001
    fillet001_edges = [fillet001.edges().sort_by_distance(p)[0] for p in [
        (5, -32, 30),
        (35, -32, 30),
        (5, 32, 30),
        (35, 32, 30),
    ]]
    fillet(fillet001_edges, radius=FILLET001_R)


solid = fillet001.part
